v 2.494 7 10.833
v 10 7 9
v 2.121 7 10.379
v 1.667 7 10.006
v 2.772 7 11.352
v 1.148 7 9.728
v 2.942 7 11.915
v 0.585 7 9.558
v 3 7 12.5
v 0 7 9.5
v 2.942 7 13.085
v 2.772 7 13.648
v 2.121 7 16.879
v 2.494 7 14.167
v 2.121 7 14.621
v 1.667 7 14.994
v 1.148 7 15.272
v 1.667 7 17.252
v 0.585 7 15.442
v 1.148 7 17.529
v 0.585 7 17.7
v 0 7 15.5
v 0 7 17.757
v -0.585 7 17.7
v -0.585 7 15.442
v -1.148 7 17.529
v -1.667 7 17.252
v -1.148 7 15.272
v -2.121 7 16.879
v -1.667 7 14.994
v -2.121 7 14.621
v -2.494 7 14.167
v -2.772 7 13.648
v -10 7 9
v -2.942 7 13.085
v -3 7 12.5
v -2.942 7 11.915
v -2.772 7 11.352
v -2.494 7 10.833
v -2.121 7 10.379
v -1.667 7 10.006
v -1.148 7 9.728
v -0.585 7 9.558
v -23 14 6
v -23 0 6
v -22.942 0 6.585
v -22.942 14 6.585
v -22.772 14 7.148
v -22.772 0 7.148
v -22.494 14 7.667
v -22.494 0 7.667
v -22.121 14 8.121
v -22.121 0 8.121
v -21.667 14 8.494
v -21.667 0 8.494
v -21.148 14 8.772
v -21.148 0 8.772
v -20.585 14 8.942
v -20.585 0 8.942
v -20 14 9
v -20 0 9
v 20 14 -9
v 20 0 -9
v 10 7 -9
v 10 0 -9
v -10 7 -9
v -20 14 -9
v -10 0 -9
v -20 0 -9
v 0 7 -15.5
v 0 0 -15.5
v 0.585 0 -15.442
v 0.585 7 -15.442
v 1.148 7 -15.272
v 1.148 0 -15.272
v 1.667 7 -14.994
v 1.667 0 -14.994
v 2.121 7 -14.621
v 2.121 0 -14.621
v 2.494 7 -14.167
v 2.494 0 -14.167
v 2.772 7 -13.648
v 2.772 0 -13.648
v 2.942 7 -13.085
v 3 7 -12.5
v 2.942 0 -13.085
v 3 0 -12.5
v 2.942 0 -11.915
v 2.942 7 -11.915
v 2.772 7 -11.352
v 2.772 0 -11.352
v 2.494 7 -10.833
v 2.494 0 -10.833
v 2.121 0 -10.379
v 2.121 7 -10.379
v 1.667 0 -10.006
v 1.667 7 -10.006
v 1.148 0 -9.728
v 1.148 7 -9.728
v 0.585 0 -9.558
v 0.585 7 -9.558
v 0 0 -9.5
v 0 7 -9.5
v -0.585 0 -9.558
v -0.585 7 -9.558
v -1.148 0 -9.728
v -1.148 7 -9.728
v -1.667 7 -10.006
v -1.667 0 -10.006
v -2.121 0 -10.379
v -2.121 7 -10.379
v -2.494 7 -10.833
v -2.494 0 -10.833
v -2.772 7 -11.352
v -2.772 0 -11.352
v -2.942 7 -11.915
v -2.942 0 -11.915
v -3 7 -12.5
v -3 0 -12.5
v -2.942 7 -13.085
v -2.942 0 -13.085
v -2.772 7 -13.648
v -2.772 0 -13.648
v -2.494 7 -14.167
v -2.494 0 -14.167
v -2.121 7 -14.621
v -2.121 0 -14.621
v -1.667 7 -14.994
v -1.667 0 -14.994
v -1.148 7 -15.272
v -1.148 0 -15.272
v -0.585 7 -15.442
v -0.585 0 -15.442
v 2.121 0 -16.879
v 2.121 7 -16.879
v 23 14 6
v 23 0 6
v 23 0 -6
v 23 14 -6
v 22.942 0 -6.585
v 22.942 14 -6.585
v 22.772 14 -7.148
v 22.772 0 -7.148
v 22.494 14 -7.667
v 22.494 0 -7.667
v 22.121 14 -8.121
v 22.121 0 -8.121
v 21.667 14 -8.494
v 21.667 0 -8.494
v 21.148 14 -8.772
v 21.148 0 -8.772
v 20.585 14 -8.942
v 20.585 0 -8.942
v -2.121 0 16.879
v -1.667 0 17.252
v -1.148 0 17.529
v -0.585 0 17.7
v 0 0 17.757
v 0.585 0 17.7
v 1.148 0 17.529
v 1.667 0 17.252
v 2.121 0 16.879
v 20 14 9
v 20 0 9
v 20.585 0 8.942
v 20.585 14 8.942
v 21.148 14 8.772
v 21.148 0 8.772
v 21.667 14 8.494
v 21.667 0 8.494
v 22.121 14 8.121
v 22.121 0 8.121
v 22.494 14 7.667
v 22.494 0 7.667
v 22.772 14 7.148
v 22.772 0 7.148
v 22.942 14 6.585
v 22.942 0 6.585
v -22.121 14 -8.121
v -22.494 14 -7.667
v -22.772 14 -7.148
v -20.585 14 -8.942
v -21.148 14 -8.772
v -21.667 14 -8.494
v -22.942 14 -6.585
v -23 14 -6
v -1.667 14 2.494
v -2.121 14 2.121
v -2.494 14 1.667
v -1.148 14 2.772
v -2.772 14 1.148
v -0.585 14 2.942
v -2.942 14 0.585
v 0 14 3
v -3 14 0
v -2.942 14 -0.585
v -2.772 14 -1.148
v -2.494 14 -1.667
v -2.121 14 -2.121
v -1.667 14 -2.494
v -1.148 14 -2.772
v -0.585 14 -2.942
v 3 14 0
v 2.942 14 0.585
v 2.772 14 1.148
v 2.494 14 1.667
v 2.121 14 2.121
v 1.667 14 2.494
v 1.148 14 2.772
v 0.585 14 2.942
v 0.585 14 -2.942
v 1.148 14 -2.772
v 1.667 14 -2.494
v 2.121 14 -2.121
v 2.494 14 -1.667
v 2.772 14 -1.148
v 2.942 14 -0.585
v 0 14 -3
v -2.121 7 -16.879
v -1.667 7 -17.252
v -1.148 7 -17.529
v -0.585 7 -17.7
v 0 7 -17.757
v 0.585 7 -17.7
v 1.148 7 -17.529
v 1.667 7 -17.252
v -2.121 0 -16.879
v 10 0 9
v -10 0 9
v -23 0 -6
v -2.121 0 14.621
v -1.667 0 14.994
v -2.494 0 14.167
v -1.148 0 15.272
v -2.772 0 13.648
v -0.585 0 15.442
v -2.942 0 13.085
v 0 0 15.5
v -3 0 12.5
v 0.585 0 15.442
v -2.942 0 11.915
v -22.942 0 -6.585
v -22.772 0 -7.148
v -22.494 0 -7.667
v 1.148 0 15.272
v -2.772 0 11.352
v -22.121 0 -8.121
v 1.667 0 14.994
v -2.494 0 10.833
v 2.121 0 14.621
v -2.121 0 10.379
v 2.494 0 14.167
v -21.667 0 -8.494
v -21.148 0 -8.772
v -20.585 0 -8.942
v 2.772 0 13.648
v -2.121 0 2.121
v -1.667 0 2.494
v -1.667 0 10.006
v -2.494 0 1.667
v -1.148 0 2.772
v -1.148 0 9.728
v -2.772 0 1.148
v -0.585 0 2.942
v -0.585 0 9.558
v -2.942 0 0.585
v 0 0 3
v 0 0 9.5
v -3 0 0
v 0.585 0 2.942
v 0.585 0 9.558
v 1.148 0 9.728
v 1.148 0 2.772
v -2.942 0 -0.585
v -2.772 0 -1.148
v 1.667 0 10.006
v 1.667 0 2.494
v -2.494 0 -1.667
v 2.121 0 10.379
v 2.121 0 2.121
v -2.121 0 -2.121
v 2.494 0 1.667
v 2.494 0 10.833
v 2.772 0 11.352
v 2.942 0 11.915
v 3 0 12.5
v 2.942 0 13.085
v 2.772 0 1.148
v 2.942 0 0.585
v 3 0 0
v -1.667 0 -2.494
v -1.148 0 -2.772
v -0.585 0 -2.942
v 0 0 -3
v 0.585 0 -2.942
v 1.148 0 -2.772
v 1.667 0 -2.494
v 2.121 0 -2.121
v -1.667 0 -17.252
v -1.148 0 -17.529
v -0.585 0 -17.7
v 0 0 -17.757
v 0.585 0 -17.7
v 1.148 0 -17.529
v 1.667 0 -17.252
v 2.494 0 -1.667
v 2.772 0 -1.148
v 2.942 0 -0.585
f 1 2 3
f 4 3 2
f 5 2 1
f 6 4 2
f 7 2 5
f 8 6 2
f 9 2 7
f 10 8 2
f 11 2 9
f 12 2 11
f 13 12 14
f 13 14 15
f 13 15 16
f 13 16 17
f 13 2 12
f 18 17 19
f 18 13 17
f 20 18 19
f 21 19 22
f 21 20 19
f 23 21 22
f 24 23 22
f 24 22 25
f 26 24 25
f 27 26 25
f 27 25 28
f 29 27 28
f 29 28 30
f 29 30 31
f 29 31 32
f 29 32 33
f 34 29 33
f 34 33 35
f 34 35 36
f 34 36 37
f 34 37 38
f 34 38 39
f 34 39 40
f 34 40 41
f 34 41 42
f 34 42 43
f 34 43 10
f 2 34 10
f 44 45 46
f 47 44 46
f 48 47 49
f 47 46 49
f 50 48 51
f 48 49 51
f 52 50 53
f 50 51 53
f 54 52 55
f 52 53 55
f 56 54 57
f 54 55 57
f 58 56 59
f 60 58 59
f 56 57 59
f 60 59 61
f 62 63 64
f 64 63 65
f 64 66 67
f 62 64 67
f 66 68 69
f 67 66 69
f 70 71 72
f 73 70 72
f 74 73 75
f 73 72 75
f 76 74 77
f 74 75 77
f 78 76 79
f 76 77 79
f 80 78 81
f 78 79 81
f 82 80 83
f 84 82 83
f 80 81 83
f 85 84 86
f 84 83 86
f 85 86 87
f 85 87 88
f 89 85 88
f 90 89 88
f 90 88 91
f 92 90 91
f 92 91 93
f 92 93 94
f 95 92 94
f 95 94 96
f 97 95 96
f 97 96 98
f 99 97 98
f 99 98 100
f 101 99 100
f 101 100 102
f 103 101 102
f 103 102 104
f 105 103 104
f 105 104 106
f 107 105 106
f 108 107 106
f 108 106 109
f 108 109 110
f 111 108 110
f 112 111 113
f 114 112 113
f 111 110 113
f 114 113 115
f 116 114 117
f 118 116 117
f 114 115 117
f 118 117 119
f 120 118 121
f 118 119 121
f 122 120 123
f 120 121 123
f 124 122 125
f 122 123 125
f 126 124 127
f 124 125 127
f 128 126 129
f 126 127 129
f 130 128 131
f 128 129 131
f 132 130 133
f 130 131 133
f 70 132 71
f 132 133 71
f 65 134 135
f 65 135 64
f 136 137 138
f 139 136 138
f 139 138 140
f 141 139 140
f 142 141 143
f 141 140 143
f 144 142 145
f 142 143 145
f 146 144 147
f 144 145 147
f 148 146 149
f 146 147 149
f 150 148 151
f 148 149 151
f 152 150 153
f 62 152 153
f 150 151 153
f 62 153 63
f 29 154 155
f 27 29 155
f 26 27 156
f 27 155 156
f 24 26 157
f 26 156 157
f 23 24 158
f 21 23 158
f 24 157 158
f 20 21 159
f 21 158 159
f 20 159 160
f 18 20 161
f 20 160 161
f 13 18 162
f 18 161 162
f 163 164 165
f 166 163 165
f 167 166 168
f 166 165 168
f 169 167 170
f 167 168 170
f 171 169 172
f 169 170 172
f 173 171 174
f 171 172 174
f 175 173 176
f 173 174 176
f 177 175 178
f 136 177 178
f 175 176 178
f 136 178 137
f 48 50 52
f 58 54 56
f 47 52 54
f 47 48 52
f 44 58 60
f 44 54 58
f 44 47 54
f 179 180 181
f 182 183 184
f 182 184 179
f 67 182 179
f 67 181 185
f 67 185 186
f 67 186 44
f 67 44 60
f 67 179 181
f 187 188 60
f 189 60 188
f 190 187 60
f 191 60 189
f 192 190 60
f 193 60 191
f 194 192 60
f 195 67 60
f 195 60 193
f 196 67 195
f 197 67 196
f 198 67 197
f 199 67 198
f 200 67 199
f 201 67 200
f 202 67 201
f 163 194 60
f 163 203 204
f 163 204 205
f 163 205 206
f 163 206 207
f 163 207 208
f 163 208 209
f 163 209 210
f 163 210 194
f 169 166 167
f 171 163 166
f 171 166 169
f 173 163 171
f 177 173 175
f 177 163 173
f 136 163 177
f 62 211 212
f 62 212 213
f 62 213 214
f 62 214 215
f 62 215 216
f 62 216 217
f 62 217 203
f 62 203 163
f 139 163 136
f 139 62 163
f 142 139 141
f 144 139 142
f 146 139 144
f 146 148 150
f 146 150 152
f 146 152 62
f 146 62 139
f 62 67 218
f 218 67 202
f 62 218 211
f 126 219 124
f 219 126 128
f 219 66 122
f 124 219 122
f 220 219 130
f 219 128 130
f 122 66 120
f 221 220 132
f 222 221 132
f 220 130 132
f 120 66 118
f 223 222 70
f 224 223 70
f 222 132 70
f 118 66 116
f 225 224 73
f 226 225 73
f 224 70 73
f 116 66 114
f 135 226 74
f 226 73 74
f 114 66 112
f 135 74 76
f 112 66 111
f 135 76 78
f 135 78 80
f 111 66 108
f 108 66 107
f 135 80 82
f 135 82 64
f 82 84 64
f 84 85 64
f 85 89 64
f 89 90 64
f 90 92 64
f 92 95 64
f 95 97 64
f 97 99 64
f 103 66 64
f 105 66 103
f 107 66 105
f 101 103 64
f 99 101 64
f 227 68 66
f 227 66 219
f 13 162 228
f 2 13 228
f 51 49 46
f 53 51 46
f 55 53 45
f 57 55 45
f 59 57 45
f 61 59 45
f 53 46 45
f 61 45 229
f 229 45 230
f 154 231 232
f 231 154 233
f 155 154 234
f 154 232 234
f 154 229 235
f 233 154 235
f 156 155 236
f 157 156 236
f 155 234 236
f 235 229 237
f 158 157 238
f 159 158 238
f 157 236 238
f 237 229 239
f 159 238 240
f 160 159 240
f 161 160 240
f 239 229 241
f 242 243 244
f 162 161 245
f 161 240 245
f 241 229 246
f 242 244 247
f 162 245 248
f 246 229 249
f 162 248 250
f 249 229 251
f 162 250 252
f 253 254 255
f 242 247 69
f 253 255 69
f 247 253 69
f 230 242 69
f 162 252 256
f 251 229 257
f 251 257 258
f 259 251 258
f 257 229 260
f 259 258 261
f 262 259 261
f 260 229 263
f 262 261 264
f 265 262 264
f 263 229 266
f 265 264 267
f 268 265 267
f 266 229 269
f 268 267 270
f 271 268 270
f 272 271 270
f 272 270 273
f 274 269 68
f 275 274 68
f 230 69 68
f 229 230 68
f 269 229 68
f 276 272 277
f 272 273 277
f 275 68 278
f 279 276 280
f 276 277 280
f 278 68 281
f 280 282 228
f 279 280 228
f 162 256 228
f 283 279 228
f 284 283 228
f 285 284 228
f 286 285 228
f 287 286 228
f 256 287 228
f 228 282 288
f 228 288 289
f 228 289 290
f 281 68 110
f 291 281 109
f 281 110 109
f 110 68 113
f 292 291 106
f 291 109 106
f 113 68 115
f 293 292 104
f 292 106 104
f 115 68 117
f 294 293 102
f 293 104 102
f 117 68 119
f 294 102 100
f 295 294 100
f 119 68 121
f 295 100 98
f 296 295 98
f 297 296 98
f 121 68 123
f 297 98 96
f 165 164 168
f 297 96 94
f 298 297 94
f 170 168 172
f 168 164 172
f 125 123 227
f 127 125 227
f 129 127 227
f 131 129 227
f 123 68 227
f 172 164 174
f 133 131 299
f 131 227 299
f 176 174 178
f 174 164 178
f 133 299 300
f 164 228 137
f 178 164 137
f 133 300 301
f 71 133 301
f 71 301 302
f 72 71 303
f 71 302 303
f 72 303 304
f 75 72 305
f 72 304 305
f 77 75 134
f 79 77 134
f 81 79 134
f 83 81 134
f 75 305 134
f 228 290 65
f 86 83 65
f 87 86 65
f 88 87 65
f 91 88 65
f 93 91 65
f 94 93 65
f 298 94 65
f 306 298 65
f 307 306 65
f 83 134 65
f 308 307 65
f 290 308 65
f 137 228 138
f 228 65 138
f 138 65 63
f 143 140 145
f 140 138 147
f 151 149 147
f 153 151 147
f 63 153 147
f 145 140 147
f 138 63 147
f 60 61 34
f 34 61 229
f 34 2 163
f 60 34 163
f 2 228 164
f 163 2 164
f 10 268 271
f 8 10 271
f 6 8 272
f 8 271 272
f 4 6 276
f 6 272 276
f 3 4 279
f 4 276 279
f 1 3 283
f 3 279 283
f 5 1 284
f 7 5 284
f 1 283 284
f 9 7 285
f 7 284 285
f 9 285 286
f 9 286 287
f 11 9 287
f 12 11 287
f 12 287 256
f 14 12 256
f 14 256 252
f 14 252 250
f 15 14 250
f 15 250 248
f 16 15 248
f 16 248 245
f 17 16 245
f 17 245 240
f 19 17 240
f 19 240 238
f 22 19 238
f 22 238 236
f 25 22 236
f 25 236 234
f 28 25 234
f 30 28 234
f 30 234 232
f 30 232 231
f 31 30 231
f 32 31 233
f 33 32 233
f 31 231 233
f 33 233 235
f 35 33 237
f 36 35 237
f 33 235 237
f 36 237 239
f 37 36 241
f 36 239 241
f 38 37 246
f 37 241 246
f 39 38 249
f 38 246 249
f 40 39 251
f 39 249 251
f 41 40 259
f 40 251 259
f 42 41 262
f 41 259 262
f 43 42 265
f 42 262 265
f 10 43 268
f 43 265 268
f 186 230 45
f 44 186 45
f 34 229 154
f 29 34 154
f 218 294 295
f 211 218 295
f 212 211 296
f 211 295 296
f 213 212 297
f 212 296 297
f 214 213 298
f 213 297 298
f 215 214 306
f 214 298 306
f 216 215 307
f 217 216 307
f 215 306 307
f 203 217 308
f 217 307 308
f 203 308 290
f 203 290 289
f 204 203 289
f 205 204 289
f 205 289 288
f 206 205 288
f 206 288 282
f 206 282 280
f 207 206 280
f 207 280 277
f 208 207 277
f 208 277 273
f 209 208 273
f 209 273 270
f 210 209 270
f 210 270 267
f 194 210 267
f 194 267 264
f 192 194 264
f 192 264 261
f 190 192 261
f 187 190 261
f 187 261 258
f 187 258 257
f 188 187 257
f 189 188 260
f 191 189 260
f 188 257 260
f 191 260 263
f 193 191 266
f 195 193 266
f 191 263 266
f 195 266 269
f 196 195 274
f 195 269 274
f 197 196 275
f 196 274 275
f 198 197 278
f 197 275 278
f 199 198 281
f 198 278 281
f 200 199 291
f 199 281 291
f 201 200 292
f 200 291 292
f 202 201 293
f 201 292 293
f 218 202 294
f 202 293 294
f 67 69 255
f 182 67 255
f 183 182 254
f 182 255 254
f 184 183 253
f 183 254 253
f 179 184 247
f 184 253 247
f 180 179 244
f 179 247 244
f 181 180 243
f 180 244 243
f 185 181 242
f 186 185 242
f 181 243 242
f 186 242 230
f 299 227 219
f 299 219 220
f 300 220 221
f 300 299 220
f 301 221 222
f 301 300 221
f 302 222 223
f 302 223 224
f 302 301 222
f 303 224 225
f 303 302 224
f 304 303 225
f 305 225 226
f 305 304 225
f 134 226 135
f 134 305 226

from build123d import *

# Parameters (mm, degrees)
BOX_DEPTH          = 14
TRIANGLE_DEPTH     = 7
SKETCH4_R          = 3
CUT_EXTRUDE1_DEPTH = 33.25405106


with BuildPart() as part:
    # Sketch1 → box (new body)
    with BuildSketch(Plane(origin=(0, 0, 0), x_dir=(1, 0, 0), z_dir=(0, 1, 0))):
        with BuildLine():
            Line((-20, -9), (20, -9))
            ThreePointArc((20, -9), (22.121320344, -8.121320344), (23, -6))
            Line((23, -6), (23, 6))
            ThreePointArc((23, 6), (22.121320344, 8.121320344), (20, 9))
            Line((20, 9), (-20, 9))
            ThreePointArc((-20, 9), (-22.121320344, 8.121320344), (-23, 6))
            Line((-23, 6), (-23, -6))
            ThreePointArc((-23, -6), (-22.121320344, -8.121320344), (-20, -9))
        make_face()
    extrude(amount=BOX_DEPTH)

    # Sketch3 → triangle (add)
    with BuildSketch(Plane.XZ):
        with BuildLine():
            Line((-10, -9), (-2.121320344, -16.878679656))
            ThreePointArc((-2.121320344, -16.878679656), (0, -17.757359313), (2.121320344, -16.878679656))
            Line((2.121320344, -16.878679656), (10, -9))
            Line((10, -9), (-10, -9))
        make_face()
        with BuildLine():
            Line((2.121320344, 16.878679656), (10, 9))
            Line((10, 9), (-10, 9))
            Line((-10, 9), (-2.121320344, 16.878679656))
            ThreePointArc((-2.121320344, 16.878679656), (0, 17.757359313), (2.121320344, 16.878679656))
        make_face()
    extrude(amount=-TRIANGLE_DEPTH)

    # Sketch4 → Cut-Extrude1 (cut, through all)
    with BuildSketch(Plane.XZ):
        with Locations(Location((0, 12.5, 0), (0, 0, 270))):
            Circle(SKETCH4_R)
        with Locations(Location((0, 0, 0), (0, 0, 270))):
            Circle(SKETCH4_R)
        with Locations(Location((0, -12.5, 0), (0, 0, 270))):
            Circle(SKETCH4_R)
    extrude(amount=-CUT_EXTRUDE1_DEPTH, mode=Mode.SUBTRACT)


solid = part.part
